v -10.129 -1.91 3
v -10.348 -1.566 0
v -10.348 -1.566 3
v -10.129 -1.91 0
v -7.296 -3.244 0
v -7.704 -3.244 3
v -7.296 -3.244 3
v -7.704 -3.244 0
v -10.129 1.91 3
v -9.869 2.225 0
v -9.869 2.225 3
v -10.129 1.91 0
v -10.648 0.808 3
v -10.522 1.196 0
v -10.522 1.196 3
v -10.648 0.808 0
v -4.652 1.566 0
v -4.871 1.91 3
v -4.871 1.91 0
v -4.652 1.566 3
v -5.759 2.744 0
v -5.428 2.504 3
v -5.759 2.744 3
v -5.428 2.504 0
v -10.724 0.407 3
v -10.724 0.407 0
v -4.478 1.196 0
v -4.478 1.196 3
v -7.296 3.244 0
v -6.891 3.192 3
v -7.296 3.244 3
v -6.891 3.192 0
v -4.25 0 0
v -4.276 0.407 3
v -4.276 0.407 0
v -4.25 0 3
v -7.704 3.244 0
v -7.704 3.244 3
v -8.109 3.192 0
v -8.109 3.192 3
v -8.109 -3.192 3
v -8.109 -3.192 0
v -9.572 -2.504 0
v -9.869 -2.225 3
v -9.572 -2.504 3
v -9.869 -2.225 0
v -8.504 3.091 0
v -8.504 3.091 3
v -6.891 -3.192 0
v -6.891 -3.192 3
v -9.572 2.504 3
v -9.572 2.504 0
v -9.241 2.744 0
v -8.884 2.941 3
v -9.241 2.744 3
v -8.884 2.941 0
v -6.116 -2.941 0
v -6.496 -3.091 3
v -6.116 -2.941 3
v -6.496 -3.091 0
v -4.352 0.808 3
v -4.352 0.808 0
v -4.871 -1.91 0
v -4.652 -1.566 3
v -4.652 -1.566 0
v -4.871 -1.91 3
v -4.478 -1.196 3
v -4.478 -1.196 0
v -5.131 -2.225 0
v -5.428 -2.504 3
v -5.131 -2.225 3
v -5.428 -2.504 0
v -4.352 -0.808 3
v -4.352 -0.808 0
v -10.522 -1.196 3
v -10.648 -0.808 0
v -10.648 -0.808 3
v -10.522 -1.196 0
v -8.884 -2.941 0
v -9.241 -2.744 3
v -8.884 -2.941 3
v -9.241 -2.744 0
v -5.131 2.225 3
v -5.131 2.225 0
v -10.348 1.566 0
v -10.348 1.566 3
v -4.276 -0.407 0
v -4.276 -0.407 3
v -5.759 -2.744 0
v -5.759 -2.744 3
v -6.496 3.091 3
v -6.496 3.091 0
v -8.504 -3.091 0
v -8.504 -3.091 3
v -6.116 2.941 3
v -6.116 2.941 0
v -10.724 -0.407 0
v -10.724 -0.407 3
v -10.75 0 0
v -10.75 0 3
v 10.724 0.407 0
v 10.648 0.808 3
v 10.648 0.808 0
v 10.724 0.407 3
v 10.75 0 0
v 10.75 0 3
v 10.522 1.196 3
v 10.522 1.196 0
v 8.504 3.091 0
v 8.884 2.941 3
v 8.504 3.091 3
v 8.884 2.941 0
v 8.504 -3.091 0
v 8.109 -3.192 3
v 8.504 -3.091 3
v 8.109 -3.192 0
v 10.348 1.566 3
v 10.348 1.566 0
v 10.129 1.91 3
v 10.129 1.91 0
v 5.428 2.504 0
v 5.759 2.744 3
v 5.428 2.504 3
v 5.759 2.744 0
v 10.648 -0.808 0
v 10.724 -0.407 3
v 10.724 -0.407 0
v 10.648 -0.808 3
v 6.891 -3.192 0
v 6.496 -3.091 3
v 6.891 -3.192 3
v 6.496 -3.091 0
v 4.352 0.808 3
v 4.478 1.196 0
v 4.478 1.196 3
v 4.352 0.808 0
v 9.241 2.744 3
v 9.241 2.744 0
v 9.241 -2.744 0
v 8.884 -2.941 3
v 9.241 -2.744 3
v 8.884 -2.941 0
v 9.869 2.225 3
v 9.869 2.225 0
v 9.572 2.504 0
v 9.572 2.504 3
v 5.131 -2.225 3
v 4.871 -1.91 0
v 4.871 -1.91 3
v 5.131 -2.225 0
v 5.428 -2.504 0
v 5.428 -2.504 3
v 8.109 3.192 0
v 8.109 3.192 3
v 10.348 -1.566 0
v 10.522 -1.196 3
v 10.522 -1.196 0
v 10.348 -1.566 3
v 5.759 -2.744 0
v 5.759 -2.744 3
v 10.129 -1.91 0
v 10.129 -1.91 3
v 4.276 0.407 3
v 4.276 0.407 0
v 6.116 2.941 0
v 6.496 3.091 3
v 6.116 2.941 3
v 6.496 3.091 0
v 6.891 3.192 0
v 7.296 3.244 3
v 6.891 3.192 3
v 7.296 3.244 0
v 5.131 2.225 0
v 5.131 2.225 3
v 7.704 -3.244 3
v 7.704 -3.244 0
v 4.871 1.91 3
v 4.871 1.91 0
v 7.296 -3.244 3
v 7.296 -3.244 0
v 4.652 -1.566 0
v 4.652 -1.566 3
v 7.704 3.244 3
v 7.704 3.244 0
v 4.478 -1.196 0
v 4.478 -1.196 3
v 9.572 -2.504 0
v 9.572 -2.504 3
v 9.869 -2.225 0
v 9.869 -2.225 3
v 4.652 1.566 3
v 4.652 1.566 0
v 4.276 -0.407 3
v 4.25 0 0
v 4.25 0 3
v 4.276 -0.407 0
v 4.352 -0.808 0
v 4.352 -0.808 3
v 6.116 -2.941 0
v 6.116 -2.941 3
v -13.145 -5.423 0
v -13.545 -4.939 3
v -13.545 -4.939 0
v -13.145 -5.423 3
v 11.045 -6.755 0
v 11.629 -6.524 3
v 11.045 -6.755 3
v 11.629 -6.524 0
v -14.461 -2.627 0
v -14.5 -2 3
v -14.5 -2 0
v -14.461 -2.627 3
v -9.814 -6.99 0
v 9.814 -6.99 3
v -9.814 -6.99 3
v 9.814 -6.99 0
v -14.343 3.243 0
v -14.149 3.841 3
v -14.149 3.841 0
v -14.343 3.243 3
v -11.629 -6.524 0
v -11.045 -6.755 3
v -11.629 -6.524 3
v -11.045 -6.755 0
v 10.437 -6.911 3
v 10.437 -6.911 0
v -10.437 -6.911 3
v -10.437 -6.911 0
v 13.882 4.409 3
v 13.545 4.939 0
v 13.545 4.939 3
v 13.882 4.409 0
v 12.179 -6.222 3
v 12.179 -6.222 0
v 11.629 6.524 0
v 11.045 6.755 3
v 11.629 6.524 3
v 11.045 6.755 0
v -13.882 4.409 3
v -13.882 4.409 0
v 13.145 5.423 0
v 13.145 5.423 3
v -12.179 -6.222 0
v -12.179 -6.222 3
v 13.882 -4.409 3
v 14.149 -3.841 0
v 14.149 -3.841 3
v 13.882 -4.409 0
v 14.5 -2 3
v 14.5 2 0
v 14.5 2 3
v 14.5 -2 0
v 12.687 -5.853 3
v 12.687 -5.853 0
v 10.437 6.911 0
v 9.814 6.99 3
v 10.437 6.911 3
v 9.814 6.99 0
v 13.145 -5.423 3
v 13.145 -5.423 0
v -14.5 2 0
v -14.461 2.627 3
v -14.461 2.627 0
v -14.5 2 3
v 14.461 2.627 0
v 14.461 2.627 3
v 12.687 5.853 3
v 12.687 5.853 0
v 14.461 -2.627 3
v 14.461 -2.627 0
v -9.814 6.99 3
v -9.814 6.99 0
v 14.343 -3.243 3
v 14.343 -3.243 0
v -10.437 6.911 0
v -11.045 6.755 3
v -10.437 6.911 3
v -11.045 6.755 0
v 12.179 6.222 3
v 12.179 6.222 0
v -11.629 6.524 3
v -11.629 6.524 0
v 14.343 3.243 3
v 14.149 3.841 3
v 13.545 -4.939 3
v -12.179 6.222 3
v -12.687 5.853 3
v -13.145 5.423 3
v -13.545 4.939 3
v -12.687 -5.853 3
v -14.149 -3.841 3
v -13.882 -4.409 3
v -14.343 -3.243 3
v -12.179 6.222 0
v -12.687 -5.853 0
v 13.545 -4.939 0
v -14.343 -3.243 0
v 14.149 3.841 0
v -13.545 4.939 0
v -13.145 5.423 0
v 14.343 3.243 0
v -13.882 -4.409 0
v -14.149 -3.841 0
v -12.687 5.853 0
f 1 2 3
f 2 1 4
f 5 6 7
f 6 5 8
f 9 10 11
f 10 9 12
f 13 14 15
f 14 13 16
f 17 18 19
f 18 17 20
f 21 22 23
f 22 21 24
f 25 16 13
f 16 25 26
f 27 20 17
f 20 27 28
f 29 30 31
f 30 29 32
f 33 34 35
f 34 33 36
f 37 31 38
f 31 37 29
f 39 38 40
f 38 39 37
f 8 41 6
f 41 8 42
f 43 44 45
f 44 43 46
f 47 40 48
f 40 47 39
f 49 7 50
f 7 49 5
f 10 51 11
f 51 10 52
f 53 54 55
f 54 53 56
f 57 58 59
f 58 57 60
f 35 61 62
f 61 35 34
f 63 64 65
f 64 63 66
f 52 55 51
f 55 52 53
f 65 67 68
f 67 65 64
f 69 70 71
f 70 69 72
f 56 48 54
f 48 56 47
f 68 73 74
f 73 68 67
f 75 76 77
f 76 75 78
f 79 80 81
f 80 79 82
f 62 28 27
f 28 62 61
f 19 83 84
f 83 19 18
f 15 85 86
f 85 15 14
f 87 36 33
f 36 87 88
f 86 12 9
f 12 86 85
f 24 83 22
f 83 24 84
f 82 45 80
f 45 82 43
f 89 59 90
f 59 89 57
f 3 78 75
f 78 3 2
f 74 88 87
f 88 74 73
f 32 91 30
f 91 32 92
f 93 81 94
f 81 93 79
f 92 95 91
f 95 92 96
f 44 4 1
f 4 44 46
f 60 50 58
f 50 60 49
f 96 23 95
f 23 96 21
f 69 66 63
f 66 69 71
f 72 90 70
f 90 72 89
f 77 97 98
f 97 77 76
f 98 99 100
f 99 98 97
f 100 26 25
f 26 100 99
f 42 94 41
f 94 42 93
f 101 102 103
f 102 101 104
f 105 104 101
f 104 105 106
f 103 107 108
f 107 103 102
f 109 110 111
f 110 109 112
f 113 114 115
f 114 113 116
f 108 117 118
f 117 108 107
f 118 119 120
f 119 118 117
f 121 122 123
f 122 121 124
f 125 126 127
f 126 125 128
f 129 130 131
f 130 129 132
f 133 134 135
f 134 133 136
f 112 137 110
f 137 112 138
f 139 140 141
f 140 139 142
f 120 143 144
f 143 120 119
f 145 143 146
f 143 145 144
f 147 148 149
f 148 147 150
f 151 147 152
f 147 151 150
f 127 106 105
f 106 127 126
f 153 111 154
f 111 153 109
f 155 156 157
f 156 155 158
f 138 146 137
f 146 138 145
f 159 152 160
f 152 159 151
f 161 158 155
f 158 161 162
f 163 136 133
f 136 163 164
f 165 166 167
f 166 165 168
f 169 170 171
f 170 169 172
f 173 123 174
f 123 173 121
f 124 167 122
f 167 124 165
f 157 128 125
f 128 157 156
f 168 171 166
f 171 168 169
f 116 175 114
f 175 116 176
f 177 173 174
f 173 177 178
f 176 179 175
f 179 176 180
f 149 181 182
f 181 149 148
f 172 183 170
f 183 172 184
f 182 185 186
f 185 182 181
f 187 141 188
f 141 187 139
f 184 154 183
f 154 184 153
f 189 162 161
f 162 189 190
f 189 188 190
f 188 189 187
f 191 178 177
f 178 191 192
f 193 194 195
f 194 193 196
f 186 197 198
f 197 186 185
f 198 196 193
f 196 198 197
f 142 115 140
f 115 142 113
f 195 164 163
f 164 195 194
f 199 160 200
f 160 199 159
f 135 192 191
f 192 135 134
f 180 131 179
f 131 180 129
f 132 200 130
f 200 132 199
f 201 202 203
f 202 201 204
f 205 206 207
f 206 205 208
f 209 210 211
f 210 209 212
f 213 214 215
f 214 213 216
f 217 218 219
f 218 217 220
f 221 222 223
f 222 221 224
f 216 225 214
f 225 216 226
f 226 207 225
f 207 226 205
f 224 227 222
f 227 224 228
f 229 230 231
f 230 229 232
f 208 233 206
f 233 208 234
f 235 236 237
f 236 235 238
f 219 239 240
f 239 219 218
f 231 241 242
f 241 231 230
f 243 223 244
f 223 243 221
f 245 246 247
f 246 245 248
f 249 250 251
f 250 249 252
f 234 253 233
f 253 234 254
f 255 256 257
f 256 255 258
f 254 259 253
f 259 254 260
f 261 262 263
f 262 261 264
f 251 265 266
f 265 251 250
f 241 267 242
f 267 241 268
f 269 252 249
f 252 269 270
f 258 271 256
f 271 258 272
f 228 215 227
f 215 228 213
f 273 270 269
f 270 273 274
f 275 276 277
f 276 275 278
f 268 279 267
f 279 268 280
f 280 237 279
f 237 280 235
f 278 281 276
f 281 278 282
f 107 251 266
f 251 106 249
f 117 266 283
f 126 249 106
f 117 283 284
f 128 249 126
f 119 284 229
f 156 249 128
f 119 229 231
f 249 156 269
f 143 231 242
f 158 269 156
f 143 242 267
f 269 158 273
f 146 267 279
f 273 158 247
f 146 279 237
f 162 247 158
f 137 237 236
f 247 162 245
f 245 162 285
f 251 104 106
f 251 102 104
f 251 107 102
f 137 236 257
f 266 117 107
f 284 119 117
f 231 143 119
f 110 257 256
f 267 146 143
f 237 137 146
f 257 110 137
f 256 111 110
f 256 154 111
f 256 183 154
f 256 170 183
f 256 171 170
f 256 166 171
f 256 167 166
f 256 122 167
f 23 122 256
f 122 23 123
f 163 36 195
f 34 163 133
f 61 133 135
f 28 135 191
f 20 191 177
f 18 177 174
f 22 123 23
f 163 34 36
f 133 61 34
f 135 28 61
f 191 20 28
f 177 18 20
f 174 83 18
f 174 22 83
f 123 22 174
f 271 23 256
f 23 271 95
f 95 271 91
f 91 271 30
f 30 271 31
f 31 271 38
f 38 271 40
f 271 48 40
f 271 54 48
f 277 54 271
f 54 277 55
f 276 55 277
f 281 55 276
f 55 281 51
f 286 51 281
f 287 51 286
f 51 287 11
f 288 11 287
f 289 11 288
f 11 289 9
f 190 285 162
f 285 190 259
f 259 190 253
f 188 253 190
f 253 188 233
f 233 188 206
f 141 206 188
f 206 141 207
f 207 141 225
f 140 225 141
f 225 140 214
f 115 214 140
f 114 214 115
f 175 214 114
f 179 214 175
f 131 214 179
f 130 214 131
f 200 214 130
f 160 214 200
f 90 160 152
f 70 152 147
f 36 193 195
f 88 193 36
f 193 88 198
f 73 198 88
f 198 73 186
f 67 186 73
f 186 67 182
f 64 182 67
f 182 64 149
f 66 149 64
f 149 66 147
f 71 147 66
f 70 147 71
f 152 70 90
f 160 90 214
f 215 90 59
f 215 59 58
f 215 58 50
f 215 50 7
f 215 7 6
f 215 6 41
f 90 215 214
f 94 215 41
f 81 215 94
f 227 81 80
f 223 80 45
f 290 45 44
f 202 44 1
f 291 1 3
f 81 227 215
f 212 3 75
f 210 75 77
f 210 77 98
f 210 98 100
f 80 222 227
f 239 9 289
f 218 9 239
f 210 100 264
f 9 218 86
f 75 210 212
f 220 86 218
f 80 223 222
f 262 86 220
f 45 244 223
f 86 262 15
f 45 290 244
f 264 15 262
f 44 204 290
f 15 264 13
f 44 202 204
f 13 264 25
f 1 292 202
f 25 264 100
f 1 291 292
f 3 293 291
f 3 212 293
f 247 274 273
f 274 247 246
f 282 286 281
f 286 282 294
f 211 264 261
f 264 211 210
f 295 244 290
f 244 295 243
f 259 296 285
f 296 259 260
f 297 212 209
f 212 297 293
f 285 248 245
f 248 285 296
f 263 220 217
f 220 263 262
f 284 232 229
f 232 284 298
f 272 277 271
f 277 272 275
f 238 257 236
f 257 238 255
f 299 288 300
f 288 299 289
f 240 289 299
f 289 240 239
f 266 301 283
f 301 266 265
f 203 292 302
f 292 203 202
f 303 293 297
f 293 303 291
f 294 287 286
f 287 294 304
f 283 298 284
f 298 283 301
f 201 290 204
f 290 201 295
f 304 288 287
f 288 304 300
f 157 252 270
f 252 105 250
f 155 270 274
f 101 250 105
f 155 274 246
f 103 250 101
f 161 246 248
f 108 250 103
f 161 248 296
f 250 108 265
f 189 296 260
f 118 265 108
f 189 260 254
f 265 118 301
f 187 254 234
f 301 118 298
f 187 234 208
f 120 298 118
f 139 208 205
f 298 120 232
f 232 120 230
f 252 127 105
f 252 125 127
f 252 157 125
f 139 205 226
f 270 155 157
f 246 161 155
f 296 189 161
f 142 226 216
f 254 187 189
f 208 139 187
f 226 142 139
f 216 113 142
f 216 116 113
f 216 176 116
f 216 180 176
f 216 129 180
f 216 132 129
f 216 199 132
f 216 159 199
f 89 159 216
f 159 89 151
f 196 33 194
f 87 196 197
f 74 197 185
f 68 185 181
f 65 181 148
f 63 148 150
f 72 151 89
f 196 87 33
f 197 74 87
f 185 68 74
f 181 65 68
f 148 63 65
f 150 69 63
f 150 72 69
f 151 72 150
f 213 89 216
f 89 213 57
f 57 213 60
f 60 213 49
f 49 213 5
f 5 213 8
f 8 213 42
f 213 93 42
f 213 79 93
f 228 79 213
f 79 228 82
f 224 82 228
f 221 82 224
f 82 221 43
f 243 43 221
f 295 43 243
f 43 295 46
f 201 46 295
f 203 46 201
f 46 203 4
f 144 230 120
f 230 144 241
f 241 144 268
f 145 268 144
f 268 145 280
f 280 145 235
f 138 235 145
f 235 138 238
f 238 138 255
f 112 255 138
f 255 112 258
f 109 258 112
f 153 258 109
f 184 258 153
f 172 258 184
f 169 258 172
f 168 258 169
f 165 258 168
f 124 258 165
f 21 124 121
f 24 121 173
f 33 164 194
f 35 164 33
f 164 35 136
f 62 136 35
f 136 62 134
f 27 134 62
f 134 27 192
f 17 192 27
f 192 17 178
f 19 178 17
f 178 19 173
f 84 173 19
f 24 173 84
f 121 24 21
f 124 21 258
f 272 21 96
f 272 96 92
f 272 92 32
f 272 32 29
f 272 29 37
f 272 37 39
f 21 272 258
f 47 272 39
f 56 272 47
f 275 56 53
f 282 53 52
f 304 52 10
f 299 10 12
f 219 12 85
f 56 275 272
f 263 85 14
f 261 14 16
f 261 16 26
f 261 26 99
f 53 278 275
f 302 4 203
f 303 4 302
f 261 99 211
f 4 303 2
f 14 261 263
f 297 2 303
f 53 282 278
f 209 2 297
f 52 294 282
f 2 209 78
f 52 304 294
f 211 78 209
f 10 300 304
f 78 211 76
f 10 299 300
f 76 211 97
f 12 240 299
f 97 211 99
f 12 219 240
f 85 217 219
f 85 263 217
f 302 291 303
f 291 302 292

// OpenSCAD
$fn = 50;


difference() {
	union() {
		hull() {
			translate(v = [-9.5000000000, 2.0000000000, 0]) {
				cylinder(h = 3, r = 5);
			}
			translate(v = [9.5000000000, 2.0000000000, 0]) {
				cylinder(h = 3, r = 5);
			}
			translate(v = [-9.5000000000, -2.0000000000, 0]) {
				cylinder(h = 3, r = 5);
			}
			translate(v = [9.5000000000, -2.0000000000, 0]) {
				cylinder(h = 3, r = 5);
			}
		}
	}
	union() {
		translate(v = [-7.5000000000, 0.0000000000, -100.0000000000]) {
			cylinder(h = 200, r = 3.2500000000);
		}
		translate(v = [-7.5000000000, 0.0000000000, -100.0000000000]) {
			cylinder(h = 200, r = 3.2500000000);
		}
		translate(v = [7.5000000000, 0.0000000000, -100.0000000000]) {
			cylinder(h = 200, r = 3.2500000000);
		}
		translate(v = [7.5000000000, 0.0000000000, -100.0000000000]) {
			cylinder(h = 200, r = 3.2500000000);
		}
	}
}
